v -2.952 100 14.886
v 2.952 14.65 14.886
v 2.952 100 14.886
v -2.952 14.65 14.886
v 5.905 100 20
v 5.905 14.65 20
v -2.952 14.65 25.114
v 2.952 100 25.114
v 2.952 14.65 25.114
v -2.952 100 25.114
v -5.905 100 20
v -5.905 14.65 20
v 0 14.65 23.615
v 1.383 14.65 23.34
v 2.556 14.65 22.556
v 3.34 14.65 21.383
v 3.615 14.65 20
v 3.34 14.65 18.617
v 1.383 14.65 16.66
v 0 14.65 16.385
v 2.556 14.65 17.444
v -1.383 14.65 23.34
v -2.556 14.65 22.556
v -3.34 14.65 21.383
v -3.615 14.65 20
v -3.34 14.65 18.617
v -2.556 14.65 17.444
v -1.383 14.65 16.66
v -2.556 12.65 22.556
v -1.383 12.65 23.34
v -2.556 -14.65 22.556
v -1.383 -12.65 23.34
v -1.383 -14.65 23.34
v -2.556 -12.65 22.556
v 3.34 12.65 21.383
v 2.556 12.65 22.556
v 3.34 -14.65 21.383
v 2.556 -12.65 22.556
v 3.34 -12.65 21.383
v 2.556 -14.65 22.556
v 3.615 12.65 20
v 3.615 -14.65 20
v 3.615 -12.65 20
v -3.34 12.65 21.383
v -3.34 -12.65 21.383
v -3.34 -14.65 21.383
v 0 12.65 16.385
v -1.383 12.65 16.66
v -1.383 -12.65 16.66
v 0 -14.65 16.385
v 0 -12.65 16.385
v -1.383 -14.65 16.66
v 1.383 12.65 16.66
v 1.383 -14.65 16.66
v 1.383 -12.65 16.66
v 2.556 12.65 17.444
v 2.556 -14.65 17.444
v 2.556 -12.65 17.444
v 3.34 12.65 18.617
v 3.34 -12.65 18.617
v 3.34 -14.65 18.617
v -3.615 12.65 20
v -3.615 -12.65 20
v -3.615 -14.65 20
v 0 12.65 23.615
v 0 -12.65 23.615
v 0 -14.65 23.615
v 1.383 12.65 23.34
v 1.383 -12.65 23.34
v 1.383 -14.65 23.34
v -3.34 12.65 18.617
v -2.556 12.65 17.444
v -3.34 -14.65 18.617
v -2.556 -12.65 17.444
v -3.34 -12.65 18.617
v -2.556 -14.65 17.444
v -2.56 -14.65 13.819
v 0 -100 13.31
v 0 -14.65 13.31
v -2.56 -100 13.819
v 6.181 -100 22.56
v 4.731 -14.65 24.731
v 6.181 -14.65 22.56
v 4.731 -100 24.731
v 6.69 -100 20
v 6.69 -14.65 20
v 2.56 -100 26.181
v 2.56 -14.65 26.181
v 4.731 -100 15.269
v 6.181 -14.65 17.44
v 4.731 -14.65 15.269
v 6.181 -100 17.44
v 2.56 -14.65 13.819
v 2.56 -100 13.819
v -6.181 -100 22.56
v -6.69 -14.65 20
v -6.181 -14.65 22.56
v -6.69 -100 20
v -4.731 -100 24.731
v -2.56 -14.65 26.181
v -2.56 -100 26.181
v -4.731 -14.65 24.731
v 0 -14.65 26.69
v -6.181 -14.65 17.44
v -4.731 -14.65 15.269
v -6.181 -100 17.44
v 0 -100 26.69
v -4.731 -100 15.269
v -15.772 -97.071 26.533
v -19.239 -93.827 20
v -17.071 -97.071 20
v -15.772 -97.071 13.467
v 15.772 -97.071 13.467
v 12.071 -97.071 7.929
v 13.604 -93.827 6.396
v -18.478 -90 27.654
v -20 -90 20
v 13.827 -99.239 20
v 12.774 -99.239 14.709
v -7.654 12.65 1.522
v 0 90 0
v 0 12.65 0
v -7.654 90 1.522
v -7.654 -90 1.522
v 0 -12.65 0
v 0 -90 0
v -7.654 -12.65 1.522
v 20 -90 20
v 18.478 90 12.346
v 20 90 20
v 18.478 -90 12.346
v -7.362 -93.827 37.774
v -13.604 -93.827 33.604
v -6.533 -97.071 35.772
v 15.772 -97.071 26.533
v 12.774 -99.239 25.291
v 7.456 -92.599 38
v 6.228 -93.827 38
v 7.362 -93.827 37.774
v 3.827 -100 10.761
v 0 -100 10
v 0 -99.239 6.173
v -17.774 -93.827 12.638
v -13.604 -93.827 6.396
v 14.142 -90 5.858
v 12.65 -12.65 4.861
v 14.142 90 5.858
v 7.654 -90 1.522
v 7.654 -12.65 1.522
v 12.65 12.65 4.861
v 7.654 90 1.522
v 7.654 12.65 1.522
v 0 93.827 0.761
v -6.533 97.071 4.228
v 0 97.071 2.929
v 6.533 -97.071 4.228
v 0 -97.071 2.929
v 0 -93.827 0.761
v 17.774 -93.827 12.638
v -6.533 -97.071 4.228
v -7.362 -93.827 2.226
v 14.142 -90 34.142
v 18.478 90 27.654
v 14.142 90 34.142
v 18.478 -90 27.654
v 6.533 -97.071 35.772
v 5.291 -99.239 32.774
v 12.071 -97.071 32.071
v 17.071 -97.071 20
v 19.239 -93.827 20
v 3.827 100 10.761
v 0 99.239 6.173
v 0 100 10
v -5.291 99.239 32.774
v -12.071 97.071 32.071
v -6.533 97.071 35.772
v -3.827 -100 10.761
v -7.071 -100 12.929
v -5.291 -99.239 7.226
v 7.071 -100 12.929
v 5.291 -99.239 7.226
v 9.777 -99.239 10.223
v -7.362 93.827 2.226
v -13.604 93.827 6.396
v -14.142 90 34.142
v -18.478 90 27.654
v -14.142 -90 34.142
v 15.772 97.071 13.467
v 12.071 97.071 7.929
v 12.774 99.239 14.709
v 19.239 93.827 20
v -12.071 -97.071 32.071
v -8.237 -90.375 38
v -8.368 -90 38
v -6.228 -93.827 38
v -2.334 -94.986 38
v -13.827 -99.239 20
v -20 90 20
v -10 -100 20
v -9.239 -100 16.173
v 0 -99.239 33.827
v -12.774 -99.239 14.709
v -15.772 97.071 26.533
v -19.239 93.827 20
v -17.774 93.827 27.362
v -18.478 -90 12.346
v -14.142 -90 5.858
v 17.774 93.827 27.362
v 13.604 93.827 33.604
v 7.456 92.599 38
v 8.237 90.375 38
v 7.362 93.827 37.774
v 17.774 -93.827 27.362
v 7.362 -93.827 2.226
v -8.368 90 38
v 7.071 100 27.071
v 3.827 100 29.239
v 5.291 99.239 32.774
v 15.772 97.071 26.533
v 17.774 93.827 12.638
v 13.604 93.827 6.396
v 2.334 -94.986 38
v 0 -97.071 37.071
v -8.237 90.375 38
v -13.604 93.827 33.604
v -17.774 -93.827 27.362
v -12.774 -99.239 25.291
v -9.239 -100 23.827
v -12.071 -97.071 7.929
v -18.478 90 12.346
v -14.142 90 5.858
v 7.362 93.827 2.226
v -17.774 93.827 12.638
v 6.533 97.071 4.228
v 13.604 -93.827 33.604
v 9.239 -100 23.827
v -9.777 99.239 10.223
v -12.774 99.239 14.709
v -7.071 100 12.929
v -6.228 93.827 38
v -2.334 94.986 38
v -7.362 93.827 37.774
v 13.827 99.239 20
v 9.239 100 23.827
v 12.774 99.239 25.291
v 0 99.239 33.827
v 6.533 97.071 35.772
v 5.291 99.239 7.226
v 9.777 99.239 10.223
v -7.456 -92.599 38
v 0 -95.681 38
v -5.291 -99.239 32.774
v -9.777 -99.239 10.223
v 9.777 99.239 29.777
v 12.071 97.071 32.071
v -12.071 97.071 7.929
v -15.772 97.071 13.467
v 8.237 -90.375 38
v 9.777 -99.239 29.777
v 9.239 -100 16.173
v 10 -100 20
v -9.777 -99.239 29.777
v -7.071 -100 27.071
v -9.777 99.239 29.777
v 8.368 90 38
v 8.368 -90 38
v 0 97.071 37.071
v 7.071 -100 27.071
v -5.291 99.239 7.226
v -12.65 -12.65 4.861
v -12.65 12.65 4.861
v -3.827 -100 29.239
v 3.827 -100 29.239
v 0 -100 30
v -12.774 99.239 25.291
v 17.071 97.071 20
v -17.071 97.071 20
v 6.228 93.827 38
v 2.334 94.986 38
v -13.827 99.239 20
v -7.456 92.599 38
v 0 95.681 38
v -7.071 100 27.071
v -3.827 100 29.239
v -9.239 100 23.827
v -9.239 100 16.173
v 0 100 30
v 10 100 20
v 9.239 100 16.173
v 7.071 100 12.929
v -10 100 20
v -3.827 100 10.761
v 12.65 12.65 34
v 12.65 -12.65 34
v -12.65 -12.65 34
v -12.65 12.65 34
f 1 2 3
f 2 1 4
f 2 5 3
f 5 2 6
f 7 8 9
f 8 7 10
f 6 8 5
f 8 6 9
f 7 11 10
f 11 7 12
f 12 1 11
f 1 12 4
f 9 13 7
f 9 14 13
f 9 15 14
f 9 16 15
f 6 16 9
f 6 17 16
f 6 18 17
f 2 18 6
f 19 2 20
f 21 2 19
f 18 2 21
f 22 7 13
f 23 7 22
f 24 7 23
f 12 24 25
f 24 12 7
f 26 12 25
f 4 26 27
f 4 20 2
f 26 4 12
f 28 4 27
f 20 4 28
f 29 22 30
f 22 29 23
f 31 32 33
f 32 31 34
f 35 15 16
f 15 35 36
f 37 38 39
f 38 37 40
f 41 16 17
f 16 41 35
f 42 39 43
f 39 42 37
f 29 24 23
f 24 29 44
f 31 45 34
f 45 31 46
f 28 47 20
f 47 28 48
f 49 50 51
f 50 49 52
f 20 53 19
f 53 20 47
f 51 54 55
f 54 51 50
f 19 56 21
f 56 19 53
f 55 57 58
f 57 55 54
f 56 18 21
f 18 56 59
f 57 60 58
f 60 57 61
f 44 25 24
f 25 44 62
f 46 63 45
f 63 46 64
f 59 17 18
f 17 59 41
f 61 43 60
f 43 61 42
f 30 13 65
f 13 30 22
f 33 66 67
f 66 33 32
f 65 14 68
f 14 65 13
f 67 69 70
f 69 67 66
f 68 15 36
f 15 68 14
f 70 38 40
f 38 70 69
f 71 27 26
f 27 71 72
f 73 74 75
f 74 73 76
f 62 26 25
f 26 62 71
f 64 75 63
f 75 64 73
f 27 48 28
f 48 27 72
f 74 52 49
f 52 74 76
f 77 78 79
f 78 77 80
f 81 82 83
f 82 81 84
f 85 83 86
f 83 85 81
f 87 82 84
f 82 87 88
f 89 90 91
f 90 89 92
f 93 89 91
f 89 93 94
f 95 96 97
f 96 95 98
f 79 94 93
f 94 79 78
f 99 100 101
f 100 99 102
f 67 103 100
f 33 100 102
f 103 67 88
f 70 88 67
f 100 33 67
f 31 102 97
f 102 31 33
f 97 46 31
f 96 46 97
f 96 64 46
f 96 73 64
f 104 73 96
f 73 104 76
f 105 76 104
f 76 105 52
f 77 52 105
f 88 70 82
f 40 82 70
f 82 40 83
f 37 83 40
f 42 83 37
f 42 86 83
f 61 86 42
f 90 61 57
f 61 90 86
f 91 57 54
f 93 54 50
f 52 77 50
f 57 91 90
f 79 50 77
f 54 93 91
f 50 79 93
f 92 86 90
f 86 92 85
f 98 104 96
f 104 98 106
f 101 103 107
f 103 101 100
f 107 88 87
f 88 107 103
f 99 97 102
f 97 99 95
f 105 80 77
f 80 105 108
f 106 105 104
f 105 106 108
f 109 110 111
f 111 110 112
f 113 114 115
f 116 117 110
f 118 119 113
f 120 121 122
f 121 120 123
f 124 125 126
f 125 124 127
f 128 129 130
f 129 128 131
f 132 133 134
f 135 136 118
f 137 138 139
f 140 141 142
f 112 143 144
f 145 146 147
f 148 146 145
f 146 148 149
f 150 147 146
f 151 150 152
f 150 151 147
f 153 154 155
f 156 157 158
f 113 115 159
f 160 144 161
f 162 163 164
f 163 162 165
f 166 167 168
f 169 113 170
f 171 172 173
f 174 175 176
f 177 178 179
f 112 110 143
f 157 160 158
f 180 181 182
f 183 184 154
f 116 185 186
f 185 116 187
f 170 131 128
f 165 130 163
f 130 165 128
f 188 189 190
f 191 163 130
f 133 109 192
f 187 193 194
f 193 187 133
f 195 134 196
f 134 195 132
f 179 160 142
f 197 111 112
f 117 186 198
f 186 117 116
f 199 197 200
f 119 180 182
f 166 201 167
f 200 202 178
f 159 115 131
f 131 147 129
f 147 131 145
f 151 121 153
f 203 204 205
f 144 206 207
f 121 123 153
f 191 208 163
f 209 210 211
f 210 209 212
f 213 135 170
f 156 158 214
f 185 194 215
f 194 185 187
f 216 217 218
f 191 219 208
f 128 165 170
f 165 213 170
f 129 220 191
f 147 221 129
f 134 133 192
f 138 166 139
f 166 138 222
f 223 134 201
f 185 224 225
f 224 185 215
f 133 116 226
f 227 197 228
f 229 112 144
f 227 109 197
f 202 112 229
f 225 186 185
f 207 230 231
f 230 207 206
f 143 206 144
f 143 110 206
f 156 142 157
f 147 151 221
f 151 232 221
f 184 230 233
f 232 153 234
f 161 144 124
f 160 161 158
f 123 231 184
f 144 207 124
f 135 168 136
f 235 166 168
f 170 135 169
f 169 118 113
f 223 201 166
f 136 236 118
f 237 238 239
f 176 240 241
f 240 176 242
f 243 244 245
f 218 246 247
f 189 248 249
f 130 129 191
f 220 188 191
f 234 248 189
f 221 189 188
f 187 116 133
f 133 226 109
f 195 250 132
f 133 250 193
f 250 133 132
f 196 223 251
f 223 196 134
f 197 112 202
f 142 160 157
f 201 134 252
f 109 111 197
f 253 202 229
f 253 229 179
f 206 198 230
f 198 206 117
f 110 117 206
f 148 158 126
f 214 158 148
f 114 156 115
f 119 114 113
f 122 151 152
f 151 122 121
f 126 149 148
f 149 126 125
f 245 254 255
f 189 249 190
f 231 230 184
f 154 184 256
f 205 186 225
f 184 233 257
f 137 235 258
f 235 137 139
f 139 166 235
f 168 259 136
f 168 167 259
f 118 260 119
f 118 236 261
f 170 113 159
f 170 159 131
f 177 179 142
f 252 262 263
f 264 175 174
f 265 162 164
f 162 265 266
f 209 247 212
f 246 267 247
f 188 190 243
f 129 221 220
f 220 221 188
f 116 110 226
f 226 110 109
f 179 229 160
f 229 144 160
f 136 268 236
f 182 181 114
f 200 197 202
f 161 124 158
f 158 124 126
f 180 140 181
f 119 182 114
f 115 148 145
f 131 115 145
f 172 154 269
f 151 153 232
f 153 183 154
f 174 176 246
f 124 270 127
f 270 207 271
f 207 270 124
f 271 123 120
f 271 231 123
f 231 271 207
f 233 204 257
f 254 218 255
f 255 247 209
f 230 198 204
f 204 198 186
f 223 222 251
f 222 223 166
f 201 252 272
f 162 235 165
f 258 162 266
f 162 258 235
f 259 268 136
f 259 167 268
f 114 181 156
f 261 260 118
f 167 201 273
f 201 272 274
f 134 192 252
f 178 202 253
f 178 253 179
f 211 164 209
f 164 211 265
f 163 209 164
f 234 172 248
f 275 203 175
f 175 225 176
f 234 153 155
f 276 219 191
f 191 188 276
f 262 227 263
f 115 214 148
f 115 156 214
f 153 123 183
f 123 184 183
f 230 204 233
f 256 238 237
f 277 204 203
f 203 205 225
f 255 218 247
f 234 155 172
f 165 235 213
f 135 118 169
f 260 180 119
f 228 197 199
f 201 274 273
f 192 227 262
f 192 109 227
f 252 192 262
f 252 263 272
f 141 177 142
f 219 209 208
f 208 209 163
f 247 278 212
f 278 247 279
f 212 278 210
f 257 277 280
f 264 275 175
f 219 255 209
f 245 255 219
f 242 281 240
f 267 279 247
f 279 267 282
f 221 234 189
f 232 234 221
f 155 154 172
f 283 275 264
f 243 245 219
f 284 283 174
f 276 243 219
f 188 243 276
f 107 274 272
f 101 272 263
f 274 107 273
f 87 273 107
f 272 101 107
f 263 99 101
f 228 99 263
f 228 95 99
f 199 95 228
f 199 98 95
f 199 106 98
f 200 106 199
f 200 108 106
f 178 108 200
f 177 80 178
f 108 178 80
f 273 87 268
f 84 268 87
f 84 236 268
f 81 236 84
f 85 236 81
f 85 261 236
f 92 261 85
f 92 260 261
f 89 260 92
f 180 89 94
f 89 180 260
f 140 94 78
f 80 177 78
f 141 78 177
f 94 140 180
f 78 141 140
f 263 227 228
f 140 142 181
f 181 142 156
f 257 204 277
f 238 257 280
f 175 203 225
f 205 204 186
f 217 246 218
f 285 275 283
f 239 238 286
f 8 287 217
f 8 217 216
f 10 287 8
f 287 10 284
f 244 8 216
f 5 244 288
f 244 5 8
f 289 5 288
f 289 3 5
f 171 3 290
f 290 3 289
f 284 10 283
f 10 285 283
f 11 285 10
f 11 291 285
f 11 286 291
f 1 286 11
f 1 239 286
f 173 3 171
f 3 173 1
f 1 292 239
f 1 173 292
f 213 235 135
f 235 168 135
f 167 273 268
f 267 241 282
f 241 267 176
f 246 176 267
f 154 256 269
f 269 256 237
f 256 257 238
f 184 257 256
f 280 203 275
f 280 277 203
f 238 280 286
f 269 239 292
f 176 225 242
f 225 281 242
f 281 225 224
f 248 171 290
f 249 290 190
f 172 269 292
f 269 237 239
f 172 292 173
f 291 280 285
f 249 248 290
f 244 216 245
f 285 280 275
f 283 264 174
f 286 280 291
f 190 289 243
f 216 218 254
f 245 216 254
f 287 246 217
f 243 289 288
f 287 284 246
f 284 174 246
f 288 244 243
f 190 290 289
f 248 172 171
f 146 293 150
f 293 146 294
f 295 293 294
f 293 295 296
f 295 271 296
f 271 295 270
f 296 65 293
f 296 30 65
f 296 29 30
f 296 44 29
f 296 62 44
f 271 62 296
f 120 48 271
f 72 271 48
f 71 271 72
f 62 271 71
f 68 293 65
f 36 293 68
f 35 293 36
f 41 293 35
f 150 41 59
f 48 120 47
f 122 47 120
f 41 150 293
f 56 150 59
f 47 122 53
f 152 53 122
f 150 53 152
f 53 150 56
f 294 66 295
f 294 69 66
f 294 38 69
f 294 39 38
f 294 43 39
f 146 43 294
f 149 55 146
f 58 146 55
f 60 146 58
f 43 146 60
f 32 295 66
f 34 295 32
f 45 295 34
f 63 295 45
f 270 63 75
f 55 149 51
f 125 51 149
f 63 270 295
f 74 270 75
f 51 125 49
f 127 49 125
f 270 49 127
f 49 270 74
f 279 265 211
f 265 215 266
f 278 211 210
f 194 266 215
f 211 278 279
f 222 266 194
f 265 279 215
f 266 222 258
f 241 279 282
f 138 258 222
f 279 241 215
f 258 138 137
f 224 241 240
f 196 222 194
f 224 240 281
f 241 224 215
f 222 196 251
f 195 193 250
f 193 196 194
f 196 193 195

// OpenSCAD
$fn=16;

bolt=5.83+1.2;
boltPad=2;
boltHead=12.18+1;
nut=11.11+.5;
nutPad=boltPad;

handleD=40;
handleL=200;
r=10;

profile=25+.3;
profileWall=2;
profileCut=0.85*handleD;

topCut=2;

wall=2;

tol=0.2;

difference(){
	rotate([90,0,0]) translate([0,handleD/2,-handleL/2]) cylinderRounded(d=[0,handleD],h=handleL,r=[0,r,0,r]);
	
	#translate([0,0,handleD/2]) rotate([90,0,0]) bolt(bolt=bolt,boltL=handleL,boltHeadL=handleL,boltHead=boltHead,boltPad=profile/2+boltPad,nut=nut,nutPad=profile/2+nutPad,nutL=handleL,sideCutL=0, sideCutSlot=4,layer=0,tol=tol);

	translate([-profile/2,-profile/2,0]) cube([profile,profile,profileCut]);
	
	translate([-handleL/2,-handleL/2,handleD-topCut]) cube([handleL,handleL,2*topCut]);
}


///////////////////////////////////////////////

module cylinderRounded(d=[20,40],h=30,r=[1,-10,4,1]){
	rotate_extrude(convexity = 10)
	{
		//square
		difference(){
			translate([d[0]/2,0,0]) square([(d[1]-d[0])/2,h]);
			if(r[0]>0) translate([d[0]/2,0,0]) square([r[0],r[0]]);
			if(r[1]>0) translate([d[1]/2-r[1],0,0]) square([r[1],r[1]]);
			if(r[2]>0) translate([d[0]/2,h-r[2],0]) square([r[2],r[2]]);
			if(r[3]>0) translate([d[1]/2-r[3],h-r[3],0]) square([r[3],r[3]]);
		}
		
		//corners
		
		if(r[0]>0){
			intersection(){
				translate([d[0]/2+r[0], r[0], 0]) circle(r = r[0]);
				translate([d[0]/2,0,0]) square([r[0],r[0]]);
			}
		} else {
			difference(){
				translate([d[0]/2+r[0], 0, 0]) square([-r[0],-r[0]]);
				translate([d[0]/2+r[0], -r[0], 0]) circle(r = -r[0]);
			}
		}
		
		if(r[1]>0){
			intersection(){
				translate([d[1]/2-r[1], r[1], 0]) circle(r = r[1]);
				translate([d[1]/2-r[1],0,0]) square([r[1],r[1]]);
			}
		} else {
			difference(){
				translate([d[1]/2, 0, 0]) square([-r[1],-r[1]]);
				translate([d[1]/2-r[1], -r[1], 0]) circle(r = -r[1]);
			}
		}
		
		if(r[2]>0){
			intersection(){
				translate([d[0]/2+r[2], h-r[2], 0]) circle(r = r[2]);
				translate([d[0]/2,h-r[2],0]) square([r[2],r[2]]);
			}
		} else {
			difference(){
				translate([d[0]/2+r[2], h+r[2], 0]) square([-r[2],-r[2]]);
				translate([d[0]/2+r[2], h+r[2], 0]) circle(r = -r[2]);
			}
		}

		if(r[3]>0){
			intersection(){
				translate([d[1]/2-r[3], h-r[3], 0]) circle(r = r[3]);
				translate([d[1]/2-r[3],h-r[3],0]) square([r[3],r[3]]);
			}
		} else {
			difference(){
				translate([d[1]/2, h+r[3], 0]) square([-r[3],-r[3]]);
				translate([d[1]/2-r[3], h+r[3], 0]) circle(r = -r[3]);
			}
		}		
	}
}

module bolt(bolt=3, boltHead=6, boltPad=3, boltHeadL=50, boltL=50, nut=6.3, nutPad=5, nutL=4, nutR=0, sideCutL=50, sideCutSlot=4, layer=0.2,tol=0.2,not=0.01){
	
	translate([0,0,-boltL+not+boltPad]) cylinder(d=bolt+tol,h=boltL);

	translate([0,0,boltPad-2*layer]) difference(){
		cylinder(d=boltHead+tol,h=boltHeadL);
		
		//easy print
		if(layer>0){
			translate([(bolt+tol)/2,-(boltHead+tol)/2,-not]) cube([(boltHead-bolt)/2,boltHead+tol,2*layer+not]);
			translate([-(boltHead+tol)/2,-(boltHead+tol)/2,-not]) cube([(boltHead-bolt)/2,boltHead+tol,2*layer+not]);
			translate([-(boltHead+tol)/2,-(boltHead+tol)/2,-not]) cube([boltHead+tol,(boltHead-bolt)/2,layer+not]);
			translate([-(boltHead+tol)/2,(bolt+tol)/2,-not]) cube([boltHead+tol,(boltHead-bolt)/2,layer+not]);
		}
	}
	
	//nut
	if(nut>0 && nutL>0){
		rotate([0,0,nutR]){
			translate([0,0,-nutPad-nutL-sideCutSlot]){
				cylinder(d=nut+tol,h=nutL+sideCutSlot,$fn=6);
				hull(){
					 cylinder(d=nut+tol,h=nutL,$fn=6);
					translate([sideCutL,0,0]) cylinder(d=nut+tol,h=nutL,$fn=6);
				}
			}
		}
	}
}
